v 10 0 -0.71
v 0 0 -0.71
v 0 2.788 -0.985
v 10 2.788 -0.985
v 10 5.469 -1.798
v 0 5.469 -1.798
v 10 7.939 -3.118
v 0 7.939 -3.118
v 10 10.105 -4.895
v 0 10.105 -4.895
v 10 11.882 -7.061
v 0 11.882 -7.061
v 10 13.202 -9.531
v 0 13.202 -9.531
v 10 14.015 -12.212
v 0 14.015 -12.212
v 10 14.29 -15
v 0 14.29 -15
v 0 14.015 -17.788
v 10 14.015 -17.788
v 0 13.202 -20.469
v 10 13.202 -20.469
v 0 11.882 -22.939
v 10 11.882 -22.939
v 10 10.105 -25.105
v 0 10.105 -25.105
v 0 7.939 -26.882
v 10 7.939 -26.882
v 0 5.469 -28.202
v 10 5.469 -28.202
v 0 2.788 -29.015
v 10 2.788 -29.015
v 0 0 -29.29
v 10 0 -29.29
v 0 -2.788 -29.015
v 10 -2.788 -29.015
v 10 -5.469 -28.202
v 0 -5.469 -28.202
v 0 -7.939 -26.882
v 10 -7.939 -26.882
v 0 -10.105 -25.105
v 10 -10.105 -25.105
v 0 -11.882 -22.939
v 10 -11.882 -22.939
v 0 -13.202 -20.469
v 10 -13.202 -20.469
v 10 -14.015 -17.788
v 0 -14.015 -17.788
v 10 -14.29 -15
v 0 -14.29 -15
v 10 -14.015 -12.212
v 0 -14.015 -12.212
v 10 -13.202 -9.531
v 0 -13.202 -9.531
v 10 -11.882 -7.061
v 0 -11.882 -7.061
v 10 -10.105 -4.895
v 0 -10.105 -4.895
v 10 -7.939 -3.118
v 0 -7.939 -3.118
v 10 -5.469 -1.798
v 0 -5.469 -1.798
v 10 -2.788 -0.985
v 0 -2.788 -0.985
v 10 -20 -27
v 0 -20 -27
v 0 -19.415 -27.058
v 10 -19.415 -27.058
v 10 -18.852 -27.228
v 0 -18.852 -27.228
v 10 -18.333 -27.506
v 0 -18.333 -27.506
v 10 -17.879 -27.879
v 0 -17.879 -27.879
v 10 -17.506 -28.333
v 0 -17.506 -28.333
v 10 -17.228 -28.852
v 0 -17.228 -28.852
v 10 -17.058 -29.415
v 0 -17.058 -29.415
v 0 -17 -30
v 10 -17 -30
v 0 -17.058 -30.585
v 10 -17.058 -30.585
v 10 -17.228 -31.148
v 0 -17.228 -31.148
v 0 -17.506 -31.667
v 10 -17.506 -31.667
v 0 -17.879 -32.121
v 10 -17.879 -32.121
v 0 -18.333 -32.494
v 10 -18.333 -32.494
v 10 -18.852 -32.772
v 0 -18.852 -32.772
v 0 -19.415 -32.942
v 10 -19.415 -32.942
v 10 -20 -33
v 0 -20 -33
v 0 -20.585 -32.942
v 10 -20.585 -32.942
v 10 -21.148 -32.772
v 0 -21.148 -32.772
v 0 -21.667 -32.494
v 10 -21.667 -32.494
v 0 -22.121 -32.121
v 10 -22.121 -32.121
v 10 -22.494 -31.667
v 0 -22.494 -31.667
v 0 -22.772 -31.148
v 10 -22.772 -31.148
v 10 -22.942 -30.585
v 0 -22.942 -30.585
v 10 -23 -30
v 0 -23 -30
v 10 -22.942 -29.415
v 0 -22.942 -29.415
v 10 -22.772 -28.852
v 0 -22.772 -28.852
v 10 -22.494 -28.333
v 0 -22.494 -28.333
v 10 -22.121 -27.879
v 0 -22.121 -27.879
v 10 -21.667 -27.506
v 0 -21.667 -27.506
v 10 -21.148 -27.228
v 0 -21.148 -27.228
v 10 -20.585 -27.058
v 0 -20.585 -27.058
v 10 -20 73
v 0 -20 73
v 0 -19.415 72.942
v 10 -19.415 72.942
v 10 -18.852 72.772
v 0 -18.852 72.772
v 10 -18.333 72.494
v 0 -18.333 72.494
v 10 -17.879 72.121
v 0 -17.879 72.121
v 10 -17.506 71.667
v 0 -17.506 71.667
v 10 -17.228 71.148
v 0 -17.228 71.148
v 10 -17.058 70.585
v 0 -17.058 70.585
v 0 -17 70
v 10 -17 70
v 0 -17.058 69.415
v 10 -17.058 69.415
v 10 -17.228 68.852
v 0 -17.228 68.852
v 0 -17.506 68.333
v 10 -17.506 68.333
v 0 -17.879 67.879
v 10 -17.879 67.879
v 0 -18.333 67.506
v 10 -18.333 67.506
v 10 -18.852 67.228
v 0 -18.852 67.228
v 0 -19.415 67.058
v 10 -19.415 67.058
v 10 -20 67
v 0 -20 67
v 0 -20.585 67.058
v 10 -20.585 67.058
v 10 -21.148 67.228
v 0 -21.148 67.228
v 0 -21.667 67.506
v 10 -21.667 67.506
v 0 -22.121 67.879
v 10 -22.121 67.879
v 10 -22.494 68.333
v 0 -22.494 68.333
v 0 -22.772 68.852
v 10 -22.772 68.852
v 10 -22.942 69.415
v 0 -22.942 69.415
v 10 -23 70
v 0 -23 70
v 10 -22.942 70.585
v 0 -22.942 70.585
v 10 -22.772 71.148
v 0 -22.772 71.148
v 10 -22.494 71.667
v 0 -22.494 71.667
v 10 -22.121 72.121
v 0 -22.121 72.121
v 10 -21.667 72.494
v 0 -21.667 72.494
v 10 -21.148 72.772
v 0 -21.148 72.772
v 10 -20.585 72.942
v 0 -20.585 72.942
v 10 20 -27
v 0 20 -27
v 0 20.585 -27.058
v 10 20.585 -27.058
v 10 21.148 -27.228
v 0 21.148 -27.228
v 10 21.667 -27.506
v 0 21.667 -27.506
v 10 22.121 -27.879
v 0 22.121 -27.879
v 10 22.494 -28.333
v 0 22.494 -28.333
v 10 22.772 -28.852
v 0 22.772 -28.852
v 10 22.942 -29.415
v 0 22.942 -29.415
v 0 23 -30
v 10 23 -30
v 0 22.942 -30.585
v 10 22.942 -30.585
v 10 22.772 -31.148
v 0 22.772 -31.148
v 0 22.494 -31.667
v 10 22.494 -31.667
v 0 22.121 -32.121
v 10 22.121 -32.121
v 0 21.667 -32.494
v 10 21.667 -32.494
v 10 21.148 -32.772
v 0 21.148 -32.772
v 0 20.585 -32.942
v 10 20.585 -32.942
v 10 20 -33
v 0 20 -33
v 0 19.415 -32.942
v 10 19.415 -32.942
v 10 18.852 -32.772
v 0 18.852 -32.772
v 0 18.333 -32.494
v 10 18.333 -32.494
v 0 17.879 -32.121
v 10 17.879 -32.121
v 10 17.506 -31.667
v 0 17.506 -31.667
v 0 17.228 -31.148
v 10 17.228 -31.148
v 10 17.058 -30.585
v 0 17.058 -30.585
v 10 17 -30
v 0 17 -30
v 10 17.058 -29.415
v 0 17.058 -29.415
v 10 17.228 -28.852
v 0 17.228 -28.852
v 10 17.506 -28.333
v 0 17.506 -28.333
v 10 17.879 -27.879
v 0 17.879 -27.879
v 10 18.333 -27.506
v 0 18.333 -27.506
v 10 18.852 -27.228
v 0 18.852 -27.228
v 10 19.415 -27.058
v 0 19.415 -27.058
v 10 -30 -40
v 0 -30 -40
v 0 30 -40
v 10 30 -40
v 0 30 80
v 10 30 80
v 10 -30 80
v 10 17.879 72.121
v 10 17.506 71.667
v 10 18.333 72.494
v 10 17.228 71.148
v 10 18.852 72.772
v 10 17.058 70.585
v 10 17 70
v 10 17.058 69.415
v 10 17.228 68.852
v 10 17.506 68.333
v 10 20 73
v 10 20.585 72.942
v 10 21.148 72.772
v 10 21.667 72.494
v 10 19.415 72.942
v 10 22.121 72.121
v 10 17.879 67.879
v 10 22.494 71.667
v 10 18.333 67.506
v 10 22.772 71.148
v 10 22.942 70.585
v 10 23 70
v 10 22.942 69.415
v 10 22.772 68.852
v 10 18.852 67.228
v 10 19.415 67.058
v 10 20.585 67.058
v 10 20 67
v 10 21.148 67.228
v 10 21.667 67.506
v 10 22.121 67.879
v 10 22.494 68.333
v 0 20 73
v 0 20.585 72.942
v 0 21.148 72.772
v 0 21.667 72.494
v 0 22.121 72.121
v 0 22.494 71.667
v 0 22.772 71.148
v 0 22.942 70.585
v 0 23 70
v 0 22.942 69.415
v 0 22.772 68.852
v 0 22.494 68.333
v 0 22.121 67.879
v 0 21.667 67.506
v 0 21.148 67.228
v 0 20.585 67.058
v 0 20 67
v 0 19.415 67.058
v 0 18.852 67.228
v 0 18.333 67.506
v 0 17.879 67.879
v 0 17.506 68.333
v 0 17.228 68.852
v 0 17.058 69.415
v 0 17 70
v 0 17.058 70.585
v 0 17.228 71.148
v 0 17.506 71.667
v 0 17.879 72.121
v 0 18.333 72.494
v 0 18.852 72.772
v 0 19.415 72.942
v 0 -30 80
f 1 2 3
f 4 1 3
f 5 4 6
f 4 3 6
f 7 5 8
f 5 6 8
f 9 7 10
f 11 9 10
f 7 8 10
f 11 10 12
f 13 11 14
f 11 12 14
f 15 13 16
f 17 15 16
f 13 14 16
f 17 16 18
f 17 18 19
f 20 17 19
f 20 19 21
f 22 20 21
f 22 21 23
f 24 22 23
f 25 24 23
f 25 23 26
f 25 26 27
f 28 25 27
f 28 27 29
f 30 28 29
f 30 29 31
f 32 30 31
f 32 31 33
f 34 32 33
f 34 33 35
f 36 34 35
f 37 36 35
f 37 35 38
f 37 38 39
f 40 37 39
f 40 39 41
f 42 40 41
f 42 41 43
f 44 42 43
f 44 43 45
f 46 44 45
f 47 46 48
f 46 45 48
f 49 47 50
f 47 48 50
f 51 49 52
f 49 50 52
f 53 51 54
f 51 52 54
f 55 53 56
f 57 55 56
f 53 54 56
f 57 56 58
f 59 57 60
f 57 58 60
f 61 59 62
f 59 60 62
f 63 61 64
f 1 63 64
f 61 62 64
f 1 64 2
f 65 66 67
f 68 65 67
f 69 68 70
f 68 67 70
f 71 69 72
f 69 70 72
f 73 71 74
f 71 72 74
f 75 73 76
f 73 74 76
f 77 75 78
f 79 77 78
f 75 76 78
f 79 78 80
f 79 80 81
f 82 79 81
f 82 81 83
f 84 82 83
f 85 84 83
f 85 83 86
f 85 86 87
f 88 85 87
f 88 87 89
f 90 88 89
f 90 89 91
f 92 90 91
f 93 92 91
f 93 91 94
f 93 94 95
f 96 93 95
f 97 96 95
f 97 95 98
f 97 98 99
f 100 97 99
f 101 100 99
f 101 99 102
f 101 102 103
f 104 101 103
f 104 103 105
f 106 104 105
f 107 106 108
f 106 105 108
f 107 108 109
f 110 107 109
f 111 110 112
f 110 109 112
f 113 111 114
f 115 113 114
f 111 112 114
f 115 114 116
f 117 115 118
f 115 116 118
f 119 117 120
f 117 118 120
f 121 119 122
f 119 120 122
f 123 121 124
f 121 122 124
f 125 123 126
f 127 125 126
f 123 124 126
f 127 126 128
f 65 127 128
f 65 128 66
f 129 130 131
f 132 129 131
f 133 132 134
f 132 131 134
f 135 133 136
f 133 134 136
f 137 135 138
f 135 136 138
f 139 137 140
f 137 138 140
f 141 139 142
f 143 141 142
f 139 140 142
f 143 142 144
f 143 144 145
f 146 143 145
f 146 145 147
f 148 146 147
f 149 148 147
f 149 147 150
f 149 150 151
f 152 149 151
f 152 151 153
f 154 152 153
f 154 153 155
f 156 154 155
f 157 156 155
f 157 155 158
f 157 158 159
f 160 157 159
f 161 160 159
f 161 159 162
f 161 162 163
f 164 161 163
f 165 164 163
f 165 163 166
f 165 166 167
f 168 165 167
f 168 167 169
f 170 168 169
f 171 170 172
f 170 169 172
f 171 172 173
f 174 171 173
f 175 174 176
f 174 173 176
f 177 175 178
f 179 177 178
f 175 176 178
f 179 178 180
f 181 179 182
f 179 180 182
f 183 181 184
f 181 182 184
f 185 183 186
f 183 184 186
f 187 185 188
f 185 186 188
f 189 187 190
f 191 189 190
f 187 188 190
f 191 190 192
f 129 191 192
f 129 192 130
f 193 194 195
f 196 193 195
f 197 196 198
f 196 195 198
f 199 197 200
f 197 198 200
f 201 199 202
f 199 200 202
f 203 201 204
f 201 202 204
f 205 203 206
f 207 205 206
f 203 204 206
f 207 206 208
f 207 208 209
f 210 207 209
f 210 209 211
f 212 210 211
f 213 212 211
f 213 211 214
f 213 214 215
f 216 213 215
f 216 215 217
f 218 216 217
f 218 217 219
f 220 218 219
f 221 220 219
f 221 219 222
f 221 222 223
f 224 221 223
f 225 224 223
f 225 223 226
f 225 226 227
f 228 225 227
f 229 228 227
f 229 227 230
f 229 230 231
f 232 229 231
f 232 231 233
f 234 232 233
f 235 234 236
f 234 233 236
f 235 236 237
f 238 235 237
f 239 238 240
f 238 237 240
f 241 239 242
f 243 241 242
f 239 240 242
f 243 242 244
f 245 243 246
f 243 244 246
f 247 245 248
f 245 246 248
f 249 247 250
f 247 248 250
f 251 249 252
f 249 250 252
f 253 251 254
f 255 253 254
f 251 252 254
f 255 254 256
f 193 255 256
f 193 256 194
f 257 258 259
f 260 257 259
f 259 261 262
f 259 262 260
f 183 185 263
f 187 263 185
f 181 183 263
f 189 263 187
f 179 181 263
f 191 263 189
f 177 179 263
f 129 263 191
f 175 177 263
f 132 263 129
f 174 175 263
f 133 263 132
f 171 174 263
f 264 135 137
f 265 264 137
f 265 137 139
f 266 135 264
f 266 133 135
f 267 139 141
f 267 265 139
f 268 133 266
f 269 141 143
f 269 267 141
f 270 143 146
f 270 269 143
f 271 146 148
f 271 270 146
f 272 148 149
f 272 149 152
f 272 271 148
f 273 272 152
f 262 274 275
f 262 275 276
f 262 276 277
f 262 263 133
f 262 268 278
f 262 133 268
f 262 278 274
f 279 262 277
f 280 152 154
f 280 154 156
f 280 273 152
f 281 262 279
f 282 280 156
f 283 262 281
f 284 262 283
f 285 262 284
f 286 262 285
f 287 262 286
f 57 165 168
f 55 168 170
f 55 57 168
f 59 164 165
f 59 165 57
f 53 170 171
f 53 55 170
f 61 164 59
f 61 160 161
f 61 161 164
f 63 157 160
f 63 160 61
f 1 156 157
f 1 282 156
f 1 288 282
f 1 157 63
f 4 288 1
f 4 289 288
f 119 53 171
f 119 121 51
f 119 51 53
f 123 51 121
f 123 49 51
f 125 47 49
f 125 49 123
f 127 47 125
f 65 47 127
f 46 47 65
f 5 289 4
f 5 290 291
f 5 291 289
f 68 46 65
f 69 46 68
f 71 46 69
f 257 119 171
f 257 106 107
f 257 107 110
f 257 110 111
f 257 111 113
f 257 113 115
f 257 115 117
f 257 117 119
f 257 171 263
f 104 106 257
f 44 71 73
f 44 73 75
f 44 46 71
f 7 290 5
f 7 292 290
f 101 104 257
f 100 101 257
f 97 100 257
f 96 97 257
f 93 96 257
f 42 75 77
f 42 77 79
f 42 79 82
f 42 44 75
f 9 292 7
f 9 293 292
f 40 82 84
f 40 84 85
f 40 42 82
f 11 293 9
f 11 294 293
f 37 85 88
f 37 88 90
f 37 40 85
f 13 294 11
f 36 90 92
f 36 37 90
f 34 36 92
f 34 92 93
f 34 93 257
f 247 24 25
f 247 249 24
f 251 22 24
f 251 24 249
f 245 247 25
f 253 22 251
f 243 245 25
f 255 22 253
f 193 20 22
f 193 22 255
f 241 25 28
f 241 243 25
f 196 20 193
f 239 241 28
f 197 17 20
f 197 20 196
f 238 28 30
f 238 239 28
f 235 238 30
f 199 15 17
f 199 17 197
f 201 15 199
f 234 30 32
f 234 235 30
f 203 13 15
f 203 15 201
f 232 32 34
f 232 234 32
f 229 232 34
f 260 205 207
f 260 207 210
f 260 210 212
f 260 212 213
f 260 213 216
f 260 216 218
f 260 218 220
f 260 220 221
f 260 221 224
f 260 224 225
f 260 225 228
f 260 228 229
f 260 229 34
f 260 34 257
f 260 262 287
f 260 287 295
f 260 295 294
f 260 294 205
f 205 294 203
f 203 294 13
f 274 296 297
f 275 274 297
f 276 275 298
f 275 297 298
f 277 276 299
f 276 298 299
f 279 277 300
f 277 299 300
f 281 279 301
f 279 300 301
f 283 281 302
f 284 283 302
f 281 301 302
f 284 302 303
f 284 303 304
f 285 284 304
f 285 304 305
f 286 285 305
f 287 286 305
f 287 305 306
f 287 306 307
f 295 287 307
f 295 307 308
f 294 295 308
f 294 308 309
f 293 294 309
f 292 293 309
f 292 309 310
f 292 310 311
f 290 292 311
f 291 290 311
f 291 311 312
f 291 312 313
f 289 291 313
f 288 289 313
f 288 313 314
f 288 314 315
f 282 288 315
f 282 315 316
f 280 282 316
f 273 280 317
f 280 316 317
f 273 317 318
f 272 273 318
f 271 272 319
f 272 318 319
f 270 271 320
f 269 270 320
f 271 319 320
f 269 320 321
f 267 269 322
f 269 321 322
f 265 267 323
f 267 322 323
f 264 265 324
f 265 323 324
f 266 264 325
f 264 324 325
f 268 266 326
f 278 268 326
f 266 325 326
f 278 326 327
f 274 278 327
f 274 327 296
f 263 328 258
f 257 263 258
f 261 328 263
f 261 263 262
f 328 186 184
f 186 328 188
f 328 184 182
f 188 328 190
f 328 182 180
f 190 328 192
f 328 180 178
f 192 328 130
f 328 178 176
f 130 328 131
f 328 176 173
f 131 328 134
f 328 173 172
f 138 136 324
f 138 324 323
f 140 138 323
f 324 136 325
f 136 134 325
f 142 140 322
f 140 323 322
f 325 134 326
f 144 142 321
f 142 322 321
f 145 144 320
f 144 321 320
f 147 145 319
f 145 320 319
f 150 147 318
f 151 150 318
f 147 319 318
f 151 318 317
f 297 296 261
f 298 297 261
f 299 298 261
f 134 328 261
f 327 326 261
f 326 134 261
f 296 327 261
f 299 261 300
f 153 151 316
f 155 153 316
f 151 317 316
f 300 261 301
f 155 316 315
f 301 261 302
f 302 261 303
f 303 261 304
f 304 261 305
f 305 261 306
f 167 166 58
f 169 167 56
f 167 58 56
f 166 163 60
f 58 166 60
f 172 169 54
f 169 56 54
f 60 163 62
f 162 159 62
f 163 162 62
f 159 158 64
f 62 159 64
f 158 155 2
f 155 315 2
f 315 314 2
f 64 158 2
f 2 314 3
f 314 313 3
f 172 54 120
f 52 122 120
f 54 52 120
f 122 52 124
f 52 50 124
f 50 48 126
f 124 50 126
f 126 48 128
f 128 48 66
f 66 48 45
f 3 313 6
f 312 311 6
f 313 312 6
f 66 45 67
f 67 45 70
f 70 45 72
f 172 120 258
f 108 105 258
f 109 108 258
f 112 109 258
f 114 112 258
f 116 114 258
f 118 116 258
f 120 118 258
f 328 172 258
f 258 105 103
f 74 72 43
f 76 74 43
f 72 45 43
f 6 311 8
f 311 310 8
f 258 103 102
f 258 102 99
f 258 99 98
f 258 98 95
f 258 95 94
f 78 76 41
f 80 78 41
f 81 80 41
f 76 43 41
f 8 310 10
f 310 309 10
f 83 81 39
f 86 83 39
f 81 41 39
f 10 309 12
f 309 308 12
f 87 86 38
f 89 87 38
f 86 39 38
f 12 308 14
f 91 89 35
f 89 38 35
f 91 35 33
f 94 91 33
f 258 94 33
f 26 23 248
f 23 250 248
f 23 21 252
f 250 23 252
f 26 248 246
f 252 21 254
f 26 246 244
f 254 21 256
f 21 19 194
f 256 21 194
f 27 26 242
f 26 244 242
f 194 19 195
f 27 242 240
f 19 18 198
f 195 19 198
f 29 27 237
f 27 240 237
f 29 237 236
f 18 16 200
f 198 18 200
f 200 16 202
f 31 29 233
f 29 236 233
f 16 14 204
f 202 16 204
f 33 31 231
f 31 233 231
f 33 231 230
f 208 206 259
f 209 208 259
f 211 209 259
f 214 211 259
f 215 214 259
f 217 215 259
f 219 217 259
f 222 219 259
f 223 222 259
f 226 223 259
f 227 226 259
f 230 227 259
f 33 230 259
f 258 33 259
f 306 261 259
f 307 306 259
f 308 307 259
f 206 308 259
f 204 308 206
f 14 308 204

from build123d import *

# Parameters (mm, degrees)
CROQUIS1_W              = 160
CROQUIS1_H              = 60
SALIENTE_EXTRUIR1_DEPTH = 10
CROQUIS2_R              = 14.29
CORTAR_EXTRUIR1_DEPTH   = 87.02325267
CROQUIS3_W              = 40
CROQUIS3_H              = 60
CORTAR_EXTRUIR2_DEPTH   = 87.02325267
CROQUIS4_R              = 3
CORTAR_EXTRUIR3_DEPTH   = 87.02325267


with BuildPart() as part:
    # Croquis1 → Saliente-Extruir1 (new body)
    with BuildSketch(Plane(origin=(0, 0, 0), x_dir=(0, 0, -1), z_dir=(1, 0, 0))):
        Rectangle(CROQUIS1_W, CROQUIS1_H)
    extrude(amount=SALIENTE_EXTRUIR1_DEPTH)

    # Croquis2 → Cortar-Extruir1 (cut, through all)
    with BuildSketch(Plane.ZY):
        with Locations((-58.2308, 0)):
            Circle(CROQUIS2_R)
        with Locations((-15, 0)):
            Circle(CROQUIS2_R)
    extrude(amount=-CORTAR_EXTRUIR1_DEPTH, mode=Mode.SUBTRACT)

    # Croquis3 → Cortar-Extruir2 (cut, through all)
    with BuildSketch(Plane.ZY):
        with Locations((-60, 0)):
            Rectangle(CROQUIS3_W, CROQUIS3_H)
    extrude(amount=-CORTAR_EXTRUIR2_DEPTH, mode=Mode.SUBTRACT)

    # Croquis4 → Cortar-Extruir3 (cut, through all)
    with BuildSketch(Plane.ZY):
        with Locations((70, 20)):
            Circle(CROQUIS4_R)
        with Locations((-30, 20)):
            Circle(CROQUIS4_R)
        with Locations((-30, -20)):
            Circle(CROQUIS4_R)
        with Locations((70, -20)):
            Circle(CROQUIS4_R)
    extrude(amount=-CORTAR_EXTRUIR3_DEPTH, mode=Mode.SUBTRACT)


solid = part.part
